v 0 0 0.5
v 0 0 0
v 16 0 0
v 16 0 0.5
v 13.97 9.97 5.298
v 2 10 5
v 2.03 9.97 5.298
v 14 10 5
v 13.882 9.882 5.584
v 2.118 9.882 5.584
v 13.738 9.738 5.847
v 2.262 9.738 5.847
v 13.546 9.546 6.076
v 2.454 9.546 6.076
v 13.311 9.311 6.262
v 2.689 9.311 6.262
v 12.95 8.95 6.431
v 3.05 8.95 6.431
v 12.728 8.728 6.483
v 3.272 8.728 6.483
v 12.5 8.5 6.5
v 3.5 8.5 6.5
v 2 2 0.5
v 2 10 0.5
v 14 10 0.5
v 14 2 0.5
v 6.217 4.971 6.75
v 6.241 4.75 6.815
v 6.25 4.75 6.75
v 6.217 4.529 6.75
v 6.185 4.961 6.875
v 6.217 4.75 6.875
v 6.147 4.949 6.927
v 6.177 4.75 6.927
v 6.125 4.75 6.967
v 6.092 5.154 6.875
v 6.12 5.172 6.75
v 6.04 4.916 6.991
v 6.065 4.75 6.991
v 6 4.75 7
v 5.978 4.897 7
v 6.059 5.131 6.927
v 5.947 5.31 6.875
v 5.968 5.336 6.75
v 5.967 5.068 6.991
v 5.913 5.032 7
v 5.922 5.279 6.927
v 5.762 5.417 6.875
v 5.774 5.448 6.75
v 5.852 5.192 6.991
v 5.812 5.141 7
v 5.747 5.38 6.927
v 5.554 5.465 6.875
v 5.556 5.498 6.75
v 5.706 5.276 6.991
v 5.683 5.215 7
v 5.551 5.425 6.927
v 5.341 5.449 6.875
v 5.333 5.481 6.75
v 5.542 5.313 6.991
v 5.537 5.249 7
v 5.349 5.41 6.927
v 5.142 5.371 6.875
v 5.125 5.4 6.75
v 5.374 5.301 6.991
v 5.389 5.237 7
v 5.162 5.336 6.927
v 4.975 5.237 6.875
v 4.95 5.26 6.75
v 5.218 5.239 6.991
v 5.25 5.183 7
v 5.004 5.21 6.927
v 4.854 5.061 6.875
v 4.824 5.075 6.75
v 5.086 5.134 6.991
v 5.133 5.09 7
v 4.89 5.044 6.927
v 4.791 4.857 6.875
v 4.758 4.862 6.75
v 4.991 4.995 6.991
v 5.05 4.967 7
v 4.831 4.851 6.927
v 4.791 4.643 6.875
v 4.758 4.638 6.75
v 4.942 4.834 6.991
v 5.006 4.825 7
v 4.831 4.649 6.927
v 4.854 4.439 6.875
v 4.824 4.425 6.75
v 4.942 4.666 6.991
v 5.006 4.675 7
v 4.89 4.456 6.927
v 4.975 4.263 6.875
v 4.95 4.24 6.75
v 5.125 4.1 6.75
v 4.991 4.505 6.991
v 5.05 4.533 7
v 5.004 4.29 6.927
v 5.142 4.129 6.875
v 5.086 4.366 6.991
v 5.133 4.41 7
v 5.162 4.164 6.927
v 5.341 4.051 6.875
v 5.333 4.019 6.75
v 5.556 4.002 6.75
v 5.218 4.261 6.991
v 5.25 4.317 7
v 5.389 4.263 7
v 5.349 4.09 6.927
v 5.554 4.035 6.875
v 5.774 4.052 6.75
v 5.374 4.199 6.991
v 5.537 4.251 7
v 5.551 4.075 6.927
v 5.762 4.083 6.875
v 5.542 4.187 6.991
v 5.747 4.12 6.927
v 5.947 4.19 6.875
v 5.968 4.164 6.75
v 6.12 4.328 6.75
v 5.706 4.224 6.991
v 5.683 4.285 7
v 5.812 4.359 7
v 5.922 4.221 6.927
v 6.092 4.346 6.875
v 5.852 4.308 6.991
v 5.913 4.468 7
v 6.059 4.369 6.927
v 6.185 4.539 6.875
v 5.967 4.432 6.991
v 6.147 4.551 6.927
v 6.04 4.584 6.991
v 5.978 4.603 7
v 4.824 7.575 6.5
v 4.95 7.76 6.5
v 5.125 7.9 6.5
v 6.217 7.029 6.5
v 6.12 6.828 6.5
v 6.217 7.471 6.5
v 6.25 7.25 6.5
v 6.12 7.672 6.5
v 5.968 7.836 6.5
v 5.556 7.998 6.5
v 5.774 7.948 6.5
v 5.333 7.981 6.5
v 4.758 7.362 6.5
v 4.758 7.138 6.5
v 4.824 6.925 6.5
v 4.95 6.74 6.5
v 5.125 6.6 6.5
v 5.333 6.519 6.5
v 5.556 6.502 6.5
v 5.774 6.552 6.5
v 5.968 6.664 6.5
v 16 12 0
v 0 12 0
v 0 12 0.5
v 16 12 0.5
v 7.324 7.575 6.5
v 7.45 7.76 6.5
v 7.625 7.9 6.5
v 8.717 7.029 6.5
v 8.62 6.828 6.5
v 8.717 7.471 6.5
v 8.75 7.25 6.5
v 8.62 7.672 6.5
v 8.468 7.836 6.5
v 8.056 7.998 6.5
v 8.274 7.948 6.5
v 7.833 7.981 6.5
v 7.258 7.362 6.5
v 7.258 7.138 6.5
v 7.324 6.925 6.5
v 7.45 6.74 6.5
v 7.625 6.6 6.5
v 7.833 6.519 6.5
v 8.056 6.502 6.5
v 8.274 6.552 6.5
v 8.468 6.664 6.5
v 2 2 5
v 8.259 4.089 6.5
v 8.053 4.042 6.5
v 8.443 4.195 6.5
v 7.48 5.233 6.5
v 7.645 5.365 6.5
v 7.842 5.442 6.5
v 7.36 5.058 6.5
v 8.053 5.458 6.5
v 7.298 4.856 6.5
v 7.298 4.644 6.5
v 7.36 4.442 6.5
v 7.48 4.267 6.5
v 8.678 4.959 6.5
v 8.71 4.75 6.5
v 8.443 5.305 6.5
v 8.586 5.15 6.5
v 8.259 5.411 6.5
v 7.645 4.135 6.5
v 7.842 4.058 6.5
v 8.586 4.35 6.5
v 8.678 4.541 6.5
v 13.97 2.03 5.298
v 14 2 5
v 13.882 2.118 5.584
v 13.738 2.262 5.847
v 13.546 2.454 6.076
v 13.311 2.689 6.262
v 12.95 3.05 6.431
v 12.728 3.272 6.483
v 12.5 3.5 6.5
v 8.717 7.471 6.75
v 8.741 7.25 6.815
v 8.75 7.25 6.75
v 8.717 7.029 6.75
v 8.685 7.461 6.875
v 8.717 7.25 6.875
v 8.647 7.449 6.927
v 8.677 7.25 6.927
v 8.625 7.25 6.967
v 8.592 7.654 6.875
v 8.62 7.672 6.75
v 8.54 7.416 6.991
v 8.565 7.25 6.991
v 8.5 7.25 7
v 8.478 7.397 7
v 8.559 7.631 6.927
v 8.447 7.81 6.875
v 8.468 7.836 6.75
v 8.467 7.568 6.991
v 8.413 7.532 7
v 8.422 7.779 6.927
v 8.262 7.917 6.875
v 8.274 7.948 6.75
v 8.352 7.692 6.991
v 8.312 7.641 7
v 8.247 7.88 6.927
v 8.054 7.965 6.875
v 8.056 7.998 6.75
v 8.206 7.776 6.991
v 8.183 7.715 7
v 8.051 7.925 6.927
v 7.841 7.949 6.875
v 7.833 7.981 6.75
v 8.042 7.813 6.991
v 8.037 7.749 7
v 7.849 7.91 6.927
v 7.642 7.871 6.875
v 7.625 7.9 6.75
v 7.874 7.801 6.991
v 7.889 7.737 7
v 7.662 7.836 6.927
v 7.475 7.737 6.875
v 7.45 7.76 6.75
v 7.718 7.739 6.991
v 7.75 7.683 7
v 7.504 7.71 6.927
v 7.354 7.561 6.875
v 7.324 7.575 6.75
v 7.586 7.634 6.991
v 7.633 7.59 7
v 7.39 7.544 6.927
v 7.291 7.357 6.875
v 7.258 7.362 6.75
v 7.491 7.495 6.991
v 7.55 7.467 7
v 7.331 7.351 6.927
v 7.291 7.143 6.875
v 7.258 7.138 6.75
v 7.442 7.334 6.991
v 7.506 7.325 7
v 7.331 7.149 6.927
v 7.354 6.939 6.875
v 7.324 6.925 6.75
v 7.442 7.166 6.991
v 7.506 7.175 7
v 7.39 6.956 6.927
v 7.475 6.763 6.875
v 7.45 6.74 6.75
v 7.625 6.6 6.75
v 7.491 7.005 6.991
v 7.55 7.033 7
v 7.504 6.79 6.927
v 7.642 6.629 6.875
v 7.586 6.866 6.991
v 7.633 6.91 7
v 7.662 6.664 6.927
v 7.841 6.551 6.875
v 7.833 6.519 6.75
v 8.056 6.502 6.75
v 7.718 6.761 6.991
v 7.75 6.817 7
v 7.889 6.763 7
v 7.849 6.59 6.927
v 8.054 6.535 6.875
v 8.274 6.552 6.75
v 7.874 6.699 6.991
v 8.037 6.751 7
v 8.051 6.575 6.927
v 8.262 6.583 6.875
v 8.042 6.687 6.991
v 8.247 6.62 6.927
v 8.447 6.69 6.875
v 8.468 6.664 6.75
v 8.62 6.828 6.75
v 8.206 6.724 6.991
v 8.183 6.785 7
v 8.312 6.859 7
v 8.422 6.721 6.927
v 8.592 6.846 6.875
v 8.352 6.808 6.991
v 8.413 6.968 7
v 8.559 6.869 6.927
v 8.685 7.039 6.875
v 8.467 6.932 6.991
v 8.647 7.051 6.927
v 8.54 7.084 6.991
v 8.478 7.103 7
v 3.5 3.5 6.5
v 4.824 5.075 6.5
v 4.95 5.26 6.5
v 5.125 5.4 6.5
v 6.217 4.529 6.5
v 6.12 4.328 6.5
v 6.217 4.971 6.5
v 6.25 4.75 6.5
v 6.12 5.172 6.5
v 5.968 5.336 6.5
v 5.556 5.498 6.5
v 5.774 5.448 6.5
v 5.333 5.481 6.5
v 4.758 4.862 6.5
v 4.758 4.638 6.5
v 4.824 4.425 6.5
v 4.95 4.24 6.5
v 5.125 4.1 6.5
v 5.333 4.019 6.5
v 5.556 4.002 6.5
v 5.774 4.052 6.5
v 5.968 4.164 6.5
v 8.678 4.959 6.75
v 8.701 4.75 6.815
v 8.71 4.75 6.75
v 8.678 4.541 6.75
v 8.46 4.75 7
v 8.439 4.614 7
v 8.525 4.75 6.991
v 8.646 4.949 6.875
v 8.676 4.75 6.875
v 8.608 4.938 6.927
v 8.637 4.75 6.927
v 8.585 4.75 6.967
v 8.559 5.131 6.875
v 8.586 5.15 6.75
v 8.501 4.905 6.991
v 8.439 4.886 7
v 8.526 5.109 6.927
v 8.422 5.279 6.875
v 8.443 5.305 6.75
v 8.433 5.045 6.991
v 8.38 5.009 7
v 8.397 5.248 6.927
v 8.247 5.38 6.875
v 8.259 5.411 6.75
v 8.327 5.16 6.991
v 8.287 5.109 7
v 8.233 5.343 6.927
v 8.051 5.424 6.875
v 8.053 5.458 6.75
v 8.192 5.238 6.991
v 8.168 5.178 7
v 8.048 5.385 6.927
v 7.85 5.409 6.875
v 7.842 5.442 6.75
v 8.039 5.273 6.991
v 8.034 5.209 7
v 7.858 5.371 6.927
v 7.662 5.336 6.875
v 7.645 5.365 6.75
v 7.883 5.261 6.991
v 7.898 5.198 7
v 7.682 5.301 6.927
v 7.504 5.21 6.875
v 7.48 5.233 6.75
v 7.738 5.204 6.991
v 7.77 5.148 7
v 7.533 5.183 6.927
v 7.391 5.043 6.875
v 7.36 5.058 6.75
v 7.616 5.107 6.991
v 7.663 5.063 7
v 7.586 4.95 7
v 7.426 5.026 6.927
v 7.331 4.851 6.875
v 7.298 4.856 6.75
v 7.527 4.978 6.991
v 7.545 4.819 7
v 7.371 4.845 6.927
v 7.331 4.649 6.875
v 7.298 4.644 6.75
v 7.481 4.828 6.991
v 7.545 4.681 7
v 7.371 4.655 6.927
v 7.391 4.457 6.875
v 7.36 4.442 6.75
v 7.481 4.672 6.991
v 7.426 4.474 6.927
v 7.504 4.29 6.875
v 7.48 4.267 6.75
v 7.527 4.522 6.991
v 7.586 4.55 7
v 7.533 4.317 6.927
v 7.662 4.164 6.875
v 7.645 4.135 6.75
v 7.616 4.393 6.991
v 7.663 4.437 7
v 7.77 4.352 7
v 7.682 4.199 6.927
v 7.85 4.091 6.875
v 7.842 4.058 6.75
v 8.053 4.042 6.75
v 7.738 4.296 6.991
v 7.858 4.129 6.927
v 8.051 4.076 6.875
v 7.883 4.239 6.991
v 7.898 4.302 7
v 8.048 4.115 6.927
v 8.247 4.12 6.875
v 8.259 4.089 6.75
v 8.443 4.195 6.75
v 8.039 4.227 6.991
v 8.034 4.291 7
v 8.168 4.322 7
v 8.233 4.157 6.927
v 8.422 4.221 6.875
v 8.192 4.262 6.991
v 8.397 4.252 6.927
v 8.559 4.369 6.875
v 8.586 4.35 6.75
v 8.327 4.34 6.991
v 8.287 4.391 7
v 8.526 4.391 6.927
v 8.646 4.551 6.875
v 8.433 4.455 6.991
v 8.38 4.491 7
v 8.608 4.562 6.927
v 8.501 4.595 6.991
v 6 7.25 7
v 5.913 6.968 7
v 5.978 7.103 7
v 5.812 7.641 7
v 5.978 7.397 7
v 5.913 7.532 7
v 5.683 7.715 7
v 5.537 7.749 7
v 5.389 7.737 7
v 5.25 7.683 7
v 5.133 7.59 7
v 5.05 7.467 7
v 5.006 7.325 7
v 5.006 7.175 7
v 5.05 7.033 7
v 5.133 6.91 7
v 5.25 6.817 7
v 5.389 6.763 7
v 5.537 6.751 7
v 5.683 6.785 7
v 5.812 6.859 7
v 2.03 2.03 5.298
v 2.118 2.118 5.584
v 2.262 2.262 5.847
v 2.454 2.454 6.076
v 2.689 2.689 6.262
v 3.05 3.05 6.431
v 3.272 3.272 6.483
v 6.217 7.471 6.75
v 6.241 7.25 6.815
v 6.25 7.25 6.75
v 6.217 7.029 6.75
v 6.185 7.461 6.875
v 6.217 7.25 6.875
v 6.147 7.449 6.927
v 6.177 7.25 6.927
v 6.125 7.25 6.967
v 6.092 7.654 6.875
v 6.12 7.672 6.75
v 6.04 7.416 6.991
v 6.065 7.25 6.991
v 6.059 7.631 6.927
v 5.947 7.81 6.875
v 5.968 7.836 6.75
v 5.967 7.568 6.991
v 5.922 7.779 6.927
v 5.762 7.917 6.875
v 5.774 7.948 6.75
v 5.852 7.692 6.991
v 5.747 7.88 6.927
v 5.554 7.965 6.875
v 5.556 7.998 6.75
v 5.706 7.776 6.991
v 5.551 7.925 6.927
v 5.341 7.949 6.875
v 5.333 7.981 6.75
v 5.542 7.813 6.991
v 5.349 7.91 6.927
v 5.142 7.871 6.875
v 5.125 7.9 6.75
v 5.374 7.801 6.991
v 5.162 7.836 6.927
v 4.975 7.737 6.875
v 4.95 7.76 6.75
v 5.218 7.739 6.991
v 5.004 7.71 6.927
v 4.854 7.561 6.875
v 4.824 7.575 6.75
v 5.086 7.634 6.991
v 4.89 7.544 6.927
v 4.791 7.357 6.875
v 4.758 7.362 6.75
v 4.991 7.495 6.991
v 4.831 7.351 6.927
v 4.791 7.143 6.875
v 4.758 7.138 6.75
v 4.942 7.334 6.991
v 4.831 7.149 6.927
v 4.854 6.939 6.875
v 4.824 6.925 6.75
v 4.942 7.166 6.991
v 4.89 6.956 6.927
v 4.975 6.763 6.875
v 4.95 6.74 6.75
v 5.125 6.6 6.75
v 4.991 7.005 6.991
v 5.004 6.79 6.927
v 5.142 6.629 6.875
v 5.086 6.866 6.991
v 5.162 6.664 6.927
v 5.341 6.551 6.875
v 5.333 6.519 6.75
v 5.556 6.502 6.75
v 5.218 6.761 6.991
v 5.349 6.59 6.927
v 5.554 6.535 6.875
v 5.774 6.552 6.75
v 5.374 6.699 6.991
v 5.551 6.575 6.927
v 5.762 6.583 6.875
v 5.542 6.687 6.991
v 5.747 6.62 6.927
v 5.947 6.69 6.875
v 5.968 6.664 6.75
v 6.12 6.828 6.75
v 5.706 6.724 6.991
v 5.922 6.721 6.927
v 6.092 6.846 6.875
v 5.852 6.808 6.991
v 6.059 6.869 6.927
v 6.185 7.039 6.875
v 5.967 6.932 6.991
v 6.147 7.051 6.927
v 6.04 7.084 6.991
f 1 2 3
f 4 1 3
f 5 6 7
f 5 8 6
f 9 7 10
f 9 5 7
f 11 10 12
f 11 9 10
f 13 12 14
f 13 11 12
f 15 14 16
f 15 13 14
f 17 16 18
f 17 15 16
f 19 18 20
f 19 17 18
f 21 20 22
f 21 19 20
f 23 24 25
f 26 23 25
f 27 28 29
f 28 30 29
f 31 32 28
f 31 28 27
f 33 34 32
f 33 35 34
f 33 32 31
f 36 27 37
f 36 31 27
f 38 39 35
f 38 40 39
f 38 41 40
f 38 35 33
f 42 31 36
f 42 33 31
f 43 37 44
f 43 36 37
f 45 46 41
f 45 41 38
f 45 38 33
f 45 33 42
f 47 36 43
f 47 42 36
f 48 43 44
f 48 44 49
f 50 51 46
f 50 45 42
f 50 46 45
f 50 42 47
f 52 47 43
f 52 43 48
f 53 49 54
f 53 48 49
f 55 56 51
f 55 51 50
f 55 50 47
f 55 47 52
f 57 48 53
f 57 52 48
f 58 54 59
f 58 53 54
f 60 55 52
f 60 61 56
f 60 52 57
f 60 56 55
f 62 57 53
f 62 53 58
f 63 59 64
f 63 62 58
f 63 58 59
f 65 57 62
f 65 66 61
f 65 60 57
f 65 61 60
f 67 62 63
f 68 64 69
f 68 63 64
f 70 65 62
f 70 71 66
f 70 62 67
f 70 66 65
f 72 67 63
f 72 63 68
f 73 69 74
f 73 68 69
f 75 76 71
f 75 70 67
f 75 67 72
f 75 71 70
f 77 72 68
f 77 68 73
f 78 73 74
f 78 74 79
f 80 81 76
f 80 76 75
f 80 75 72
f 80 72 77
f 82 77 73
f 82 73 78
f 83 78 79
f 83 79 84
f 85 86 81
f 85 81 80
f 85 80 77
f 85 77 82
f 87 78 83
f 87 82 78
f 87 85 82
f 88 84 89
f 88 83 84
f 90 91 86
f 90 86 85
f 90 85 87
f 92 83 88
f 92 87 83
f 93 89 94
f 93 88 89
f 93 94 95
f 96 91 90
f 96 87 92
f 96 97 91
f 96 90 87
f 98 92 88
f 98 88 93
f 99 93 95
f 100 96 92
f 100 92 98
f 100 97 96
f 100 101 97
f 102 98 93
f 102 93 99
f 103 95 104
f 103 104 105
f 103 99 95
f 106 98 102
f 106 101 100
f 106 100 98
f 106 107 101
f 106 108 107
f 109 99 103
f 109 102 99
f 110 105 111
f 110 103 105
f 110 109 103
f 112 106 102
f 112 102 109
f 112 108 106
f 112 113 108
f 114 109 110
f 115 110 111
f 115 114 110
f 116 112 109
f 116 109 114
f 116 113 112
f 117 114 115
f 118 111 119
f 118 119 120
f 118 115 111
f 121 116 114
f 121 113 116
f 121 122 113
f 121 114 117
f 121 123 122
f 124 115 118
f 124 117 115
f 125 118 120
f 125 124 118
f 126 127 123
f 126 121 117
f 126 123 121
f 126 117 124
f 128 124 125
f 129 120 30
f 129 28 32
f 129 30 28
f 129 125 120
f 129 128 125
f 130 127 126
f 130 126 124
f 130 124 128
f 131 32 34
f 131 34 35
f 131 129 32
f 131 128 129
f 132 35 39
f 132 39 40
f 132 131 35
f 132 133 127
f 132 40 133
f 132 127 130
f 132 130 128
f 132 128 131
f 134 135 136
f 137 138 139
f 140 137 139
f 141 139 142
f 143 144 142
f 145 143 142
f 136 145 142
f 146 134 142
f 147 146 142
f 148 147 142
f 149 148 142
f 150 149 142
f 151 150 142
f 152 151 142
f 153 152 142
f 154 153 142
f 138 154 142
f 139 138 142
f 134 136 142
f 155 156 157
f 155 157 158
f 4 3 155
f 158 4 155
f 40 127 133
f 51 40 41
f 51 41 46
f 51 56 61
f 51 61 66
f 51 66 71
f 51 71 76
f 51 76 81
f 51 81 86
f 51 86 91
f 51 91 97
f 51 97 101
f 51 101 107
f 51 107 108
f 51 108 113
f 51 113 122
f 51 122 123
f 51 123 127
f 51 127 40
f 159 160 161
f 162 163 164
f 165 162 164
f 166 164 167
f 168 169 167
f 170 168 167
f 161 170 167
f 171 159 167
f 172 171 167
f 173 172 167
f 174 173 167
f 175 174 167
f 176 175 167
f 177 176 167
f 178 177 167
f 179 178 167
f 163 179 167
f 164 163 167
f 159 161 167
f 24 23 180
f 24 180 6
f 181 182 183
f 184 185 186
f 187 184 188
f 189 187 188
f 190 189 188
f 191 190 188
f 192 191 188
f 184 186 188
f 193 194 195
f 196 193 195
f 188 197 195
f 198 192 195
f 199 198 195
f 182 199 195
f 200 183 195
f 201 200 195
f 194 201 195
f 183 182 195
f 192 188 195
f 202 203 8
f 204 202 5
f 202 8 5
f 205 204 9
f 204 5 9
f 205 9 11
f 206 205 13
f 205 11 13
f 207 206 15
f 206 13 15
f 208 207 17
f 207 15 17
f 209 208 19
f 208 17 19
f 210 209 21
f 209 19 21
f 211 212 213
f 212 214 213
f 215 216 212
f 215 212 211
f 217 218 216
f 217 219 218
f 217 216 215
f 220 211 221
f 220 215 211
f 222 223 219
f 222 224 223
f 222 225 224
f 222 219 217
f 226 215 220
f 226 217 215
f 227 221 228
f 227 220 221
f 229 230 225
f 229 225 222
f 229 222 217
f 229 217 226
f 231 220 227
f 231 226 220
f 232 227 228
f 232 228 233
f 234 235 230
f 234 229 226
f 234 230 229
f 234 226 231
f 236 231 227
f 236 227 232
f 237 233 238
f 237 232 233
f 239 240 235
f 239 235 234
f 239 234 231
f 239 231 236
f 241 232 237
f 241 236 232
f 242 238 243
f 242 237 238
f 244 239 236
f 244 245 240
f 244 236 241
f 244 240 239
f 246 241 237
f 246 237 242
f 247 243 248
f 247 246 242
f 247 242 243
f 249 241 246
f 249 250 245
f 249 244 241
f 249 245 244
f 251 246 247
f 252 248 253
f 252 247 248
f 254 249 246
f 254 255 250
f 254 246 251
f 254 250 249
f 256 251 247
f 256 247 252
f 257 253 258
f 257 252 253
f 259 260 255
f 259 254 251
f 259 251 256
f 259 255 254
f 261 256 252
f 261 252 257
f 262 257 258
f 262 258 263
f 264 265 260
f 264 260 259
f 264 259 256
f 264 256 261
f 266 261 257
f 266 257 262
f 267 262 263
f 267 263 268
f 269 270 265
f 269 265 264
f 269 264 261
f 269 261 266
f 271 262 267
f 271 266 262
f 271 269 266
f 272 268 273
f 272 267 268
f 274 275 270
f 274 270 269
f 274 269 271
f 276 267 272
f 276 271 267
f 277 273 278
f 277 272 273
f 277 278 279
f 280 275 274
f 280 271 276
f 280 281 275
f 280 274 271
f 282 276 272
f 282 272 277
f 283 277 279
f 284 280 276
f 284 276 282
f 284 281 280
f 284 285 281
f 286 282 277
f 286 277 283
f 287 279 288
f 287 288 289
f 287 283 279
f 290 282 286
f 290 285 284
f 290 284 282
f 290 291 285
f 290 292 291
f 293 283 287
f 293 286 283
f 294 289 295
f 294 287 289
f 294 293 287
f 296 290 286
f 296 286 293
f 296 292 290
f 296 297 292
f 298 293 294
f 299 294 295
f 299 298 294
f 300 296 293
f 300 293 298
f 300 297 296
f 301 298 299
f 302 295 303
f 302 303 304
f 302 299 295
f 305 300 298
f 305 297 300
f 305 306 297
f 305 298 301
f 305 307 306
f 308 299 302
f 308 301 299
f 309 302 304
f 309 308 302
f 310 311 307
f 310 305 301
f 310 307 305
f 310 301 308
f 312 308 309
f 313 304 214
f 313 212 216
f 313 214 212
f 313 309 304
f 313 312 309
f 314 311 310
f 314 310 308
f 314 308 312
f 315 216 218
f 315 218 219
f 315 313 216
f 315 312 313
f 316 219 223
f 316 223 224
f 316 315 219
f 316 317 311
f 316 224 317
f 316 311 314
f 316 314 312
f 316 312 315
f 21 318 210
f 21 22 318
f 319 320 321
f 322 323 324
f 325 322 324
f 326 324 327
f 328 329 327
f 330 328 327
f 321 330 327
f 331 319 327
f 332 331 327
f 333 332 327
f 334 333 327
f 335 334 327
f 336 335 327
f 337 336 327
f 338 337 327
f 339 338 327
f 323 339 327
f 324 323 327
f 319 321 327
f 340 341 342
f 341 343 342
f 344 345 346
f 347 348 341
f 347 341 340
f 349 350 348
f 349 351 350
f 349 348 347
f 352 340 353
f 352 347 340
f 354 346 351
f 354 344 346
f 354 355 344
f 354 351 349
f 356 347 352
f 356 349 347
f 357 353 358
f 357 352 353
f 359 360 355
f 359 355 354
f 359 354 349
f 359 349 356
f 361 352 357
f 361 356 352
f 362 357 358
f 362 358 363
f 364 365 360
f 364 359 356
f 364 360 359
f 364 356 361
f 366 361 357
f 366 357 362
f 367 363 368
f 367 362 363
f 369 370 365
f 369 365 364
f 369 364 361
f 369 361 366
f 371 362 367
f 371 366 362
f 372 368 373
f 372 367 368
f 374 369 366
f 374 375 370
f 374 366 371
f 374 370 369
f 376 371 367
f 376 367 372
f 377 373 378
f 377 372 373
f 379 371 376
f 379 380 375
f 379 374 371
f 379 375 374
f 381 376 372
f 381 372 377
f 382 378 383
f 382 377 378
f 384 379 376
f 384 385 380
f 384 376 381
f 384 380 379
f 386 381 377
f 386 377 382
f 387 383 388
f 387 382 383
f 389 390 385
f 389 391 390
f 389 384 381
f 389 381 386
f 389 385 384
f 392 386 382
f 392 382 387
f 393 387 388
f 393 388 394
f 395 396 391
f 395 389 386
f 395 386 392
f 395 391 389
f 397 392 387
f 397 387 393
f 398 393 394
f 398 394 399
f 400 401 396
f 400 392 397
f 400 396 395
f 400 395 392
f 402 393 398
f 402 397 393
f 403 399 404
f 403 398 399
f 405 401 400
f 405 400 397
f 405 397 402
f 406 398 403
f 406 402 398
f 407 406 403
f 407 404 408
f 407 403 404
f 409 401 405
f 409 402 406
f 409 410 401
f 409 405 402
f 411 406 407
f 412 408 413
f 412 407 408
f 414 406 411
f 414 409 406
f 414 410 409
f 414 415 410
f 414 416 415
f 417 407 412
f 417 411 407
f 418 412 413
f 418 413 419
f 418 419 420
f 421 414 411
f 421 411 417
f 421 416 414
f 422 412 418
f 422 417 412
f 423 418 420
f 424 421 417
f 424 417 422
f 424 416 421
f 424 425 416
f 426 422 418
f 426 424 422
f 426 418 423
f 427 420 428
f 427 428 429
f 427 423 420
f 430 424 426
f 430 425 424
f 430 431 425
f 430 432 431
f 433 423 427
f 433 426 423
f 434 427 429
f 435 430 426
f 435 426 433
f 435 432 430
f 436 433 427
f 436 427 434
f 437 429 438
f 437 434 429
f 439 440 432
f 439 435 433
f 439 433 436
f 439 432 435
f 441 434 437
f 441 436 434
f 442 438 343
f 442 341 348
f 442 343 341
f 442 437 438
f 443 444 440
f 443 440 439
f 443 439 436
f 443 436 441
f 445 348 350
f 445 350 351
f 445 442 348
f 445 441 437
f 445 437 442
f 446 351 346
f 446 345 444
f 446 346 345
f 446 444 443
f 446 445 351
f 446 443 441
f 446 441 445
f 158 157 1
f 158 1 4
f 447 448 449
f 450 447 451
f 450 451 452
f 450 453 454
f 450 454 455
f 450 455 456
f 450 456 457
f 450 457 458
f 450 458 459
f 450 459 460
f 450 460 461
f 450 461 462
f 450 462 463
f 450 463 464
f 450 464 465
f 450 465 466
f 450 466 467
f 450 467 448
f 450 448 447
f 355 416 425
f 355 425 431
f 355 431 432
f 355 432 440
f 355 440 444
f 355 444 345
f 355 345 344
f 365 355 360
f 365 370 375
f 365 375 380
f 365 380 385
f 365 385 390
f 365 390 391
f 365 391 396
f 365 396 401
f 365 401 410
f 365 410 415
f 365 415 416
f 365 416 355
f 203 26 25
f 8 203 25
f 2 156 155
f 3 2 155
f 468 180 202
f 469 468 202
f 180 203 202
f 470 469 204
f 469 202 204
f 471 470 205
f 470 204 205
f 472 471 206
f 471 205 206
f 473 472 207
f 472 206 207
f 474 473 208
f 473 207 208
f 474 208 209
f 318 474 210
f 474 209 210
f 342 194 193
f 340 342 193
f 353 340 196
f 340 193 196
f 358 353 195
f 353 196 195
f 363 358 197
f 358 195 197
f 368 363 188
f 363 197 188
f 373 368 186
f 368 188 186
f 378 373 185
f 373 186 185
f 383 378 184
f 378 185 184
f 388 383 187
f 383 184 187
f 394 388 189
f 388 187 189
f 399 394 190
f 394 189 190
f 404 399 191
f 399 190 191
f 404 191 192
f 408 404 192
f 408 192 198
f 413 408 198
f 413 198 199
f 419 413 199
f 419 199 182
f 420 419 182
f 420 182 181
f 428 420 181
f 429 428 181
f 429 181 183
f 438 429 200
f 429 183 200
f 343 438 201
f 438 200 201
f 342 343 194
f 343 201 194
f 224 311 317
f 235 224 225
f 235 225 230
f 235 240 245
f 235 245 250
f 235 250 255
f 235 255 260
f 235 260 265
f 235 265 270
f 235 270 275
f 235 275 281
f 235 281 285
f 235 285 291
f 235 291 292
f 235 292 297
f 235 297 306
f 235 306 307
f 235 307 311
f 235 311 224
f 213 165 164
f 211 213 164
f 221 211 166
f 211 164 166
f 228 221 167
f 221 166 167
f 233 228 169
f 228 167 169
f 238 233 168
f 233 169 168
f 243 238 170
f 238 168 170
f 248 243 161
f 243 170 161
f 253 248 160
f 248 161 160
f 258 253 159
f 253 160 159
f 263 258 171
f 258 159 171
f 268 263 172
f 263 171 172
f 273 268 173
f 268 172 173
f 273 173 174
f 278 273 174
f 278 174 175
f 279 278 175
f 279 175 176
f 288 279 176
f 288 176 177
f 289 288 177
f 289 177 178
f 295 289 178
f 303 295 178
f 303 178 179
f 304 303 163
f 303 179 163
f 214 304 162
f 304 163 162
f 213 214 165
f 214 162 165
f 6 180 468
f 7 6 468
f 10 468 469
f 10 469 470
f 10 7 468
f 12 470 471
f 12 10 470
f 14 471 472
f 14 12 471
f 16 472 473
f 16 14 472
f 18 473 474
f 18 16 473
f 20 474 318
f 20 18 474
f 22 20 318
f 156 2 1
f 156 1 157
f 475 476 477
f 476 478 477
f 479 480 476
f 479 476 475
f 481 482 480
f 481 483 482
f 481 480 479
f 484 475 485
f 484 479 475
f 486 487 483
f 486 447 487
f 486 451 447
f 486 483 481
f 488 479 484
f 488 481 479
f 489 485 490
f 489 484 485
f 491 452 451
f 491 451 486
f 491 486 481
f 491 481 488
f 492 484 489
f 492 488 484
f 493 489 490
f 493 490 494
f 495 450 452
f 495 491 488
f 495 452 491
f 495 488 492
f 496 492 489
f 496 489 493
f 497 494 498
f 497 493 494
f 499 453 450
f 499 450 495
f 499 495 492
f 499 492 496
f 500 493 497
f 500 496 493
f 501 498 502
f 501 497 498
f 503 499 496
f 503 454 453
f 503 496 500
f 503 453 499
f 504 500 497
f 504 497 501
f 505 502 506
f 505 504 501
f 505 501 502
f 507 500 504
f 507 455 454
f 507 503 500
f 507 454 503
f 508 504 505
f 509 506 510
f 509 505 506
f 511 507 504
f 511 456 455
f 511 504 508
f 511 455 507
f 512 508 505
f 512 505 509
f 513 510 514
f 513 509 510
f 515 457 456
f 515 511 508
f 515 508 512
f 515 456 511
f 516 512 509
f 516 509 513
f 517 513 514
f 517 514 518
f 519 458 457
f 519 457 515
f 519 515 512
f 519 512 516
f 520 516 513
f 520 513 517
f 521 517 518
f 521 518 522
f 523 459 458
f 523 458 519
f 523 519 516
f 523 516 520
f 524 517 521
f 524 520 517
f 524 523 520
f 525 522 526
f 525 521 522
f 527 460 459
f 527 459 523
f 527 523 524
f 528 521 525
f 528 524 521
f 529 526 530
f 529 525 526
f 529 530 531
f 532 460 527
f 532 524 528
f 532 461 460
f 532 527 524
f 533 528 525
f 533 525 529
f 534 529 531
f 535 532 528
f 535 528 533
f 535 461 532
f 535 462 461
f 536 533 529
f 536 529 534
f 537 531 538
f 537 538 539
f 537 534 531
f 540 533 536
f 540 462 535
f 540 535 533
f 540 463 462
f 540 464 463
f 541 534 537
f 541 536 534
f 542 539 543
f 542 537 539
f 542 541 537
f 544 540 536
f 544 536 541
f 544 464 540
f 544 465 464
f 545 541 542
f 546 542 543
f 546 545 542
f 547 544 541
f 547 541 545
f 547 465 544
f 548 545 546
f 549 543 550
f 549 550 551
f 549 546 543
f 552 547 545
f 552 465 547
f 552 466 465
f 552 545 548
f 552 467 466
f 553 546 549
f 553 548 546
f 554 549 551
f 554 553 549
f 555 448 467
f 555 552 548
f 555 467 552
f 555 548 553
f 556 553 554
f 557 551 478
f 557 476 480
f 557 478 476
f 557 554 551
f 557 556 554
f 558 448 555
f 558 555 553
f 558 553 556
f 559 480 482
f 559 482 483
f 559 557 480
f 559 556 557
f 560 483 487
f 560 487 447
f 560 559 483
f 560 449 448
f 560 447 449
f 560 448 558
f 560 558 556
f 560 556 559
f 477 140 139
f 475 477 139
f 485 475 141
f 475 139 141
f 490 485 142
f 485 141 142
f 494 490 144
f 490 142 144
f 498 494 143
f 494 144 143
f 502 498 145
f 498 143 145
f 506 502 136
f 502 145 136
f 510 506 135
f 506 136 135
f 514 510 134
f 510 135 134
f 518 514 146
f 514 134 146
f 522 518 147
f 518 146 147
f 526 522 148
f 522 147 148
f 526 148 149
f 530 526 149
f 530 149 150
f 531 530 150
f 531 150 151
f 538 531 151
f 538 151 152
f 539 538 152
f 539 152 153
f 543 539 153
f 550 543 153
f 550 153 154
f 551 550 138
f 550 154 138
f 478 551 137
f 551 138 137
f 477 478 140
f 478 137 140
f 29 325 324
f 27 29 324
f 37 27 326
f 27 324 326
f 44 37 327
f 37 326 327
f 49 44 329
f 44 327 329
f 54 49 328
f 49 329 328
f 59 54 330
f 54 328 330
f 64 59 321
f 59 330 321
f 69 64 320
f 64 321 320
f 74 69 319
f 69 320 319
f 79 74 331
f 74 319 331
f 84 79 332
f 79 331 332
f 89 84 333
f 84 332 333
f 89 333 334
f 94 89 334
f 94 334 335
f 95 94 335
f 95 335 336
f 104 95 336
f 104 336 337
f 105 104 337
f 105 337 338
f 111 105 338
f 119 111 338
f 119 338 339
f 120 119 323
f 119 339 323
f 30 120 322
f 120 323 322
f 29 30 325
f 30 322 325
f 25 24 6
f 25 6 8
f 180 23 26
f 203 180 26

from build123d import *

# Parameters (mm, degrees)
SKETCH_W     = 16
SKETCH_H     = 12
PAD_DEPTH    = 0.5
SKETCH001_W  = 12
SKETCH001_H  = 8
PAD001_DEPTH = 6
FILLET_R     = 1.5
SKETCH002_R  = 0.75
PAD002_DEPTH = 0.5
FILLET001_R  = 0.25
SKETCH003_R  = 0.709805
PAD003_DEPTH = 0.5
FILLET002_R  = 0.25
SKETCH004_R  = 0.75
PAD004_DEPTH = 0.5
FILLET003_R  = 0.25
SKETCH005_R  = 0.75
PAD005_DEPTH = 0.5
FILLET004_R  = 0.25


with BuildPart() as pad:
    # Sketch → Pad (new body)
    with BuildSketch(Plane.XY):
        with Locations((8, 6)):
            Rectangle(SKETCH_W, SKETCH_H)
    extrude(amount=PAD_DEPTH)


with BuildPart() as fillet_body:
    # Sketch001 → Pad001 (new body)
    with BuildSketch(Plane.XY.offset(0.5)):
        with Locations((8, 6)):
            Rectangle(SKETCH001_W, SKETCH001_H)
    extrude(amount=PAD001_DEPTH)

    # Fillet
    fillet_edges = [fillet_body.edges().sort_by_distance(p)[0] for p in [
        (8, 2, 6.5),
        (14, 6, 6.5),
        (8, 10, 6.5),
        (2, 6, 6.5),
    ]]
    fillet(fillet_edges, radius=FILLET_R)


with BuildPart() as fillet001:
    # Sketch002 → Pad002 (new body)
    with BuildSketch(Plane.XY.offset(6.5)):
        with Locations((5.5, 4.75)):
            Circle(SKETCH002_R)
    extrude(amount=PAD002_DEPTH)

    # Fillet001
    fillet001_edges = [fillet001.edges().sort_by_distance(p)[0] for p in [
        (4.75, 4.75, 7),
    ]]
    fillet(fillet001_edges, radius=FILLET001_R)


with BuildPart() as fillet002:
    # Sketch003 → Pad003 (new body)
    with BuildSketch(Plane.XY.offset(6.5)):
        with Locations((8, 4.75)):
            Circle(SKETCH003_R)
    extrude(amount=PAD003_DEPTH)

    # Fillet002
    fillet002_edges = [fillet002.edges().sort_by_distance(p)[0] for p in [
        (7.290195, 4.75, 7),
    ]]
    fillet(fillet002_edges, radius=FILLET002_R)


with BuildPart() as fillet003:
    # Sketch004 → Pad004 (new body)
    with BuildSketch(Plane.XY.offset(6.5)):
        with Locations((5.5, 7.25)):
            Circle(SKETCH004_R)
    extrude(amount=PAD004_DEPTH)

    # Fillet003
    fillet003_edges = [fillet003.edges().sort_by_distance(p)[0] for p in [
        (4.75, 7.25, 7),
    ]]
    fillet(fillet003_edges, radius=FILLET003_R)


with BuildPart() as fillet004:
    # Sketch005 → Pad005 (new body)
    with BuildSketch(Plane.XY.offset(6.5)):
        with Locations((8, 7.25)):
            Circle(SKETCH005_R)
    extrude(amount=PAD005_DEPTH)

    # Fillet004
    fillet004_edges = [fillet004.edges().sort_by_distance(p)[0] for p in [
        (7.25, 7.25, 7),
    ]]
    fillet(fillet004_edges, radius=FILLET004_R)


solid = Compound([pad.part, fillet_body.part, fillet001.part, fillet002.part, fillet003.part, fillet004.part])
